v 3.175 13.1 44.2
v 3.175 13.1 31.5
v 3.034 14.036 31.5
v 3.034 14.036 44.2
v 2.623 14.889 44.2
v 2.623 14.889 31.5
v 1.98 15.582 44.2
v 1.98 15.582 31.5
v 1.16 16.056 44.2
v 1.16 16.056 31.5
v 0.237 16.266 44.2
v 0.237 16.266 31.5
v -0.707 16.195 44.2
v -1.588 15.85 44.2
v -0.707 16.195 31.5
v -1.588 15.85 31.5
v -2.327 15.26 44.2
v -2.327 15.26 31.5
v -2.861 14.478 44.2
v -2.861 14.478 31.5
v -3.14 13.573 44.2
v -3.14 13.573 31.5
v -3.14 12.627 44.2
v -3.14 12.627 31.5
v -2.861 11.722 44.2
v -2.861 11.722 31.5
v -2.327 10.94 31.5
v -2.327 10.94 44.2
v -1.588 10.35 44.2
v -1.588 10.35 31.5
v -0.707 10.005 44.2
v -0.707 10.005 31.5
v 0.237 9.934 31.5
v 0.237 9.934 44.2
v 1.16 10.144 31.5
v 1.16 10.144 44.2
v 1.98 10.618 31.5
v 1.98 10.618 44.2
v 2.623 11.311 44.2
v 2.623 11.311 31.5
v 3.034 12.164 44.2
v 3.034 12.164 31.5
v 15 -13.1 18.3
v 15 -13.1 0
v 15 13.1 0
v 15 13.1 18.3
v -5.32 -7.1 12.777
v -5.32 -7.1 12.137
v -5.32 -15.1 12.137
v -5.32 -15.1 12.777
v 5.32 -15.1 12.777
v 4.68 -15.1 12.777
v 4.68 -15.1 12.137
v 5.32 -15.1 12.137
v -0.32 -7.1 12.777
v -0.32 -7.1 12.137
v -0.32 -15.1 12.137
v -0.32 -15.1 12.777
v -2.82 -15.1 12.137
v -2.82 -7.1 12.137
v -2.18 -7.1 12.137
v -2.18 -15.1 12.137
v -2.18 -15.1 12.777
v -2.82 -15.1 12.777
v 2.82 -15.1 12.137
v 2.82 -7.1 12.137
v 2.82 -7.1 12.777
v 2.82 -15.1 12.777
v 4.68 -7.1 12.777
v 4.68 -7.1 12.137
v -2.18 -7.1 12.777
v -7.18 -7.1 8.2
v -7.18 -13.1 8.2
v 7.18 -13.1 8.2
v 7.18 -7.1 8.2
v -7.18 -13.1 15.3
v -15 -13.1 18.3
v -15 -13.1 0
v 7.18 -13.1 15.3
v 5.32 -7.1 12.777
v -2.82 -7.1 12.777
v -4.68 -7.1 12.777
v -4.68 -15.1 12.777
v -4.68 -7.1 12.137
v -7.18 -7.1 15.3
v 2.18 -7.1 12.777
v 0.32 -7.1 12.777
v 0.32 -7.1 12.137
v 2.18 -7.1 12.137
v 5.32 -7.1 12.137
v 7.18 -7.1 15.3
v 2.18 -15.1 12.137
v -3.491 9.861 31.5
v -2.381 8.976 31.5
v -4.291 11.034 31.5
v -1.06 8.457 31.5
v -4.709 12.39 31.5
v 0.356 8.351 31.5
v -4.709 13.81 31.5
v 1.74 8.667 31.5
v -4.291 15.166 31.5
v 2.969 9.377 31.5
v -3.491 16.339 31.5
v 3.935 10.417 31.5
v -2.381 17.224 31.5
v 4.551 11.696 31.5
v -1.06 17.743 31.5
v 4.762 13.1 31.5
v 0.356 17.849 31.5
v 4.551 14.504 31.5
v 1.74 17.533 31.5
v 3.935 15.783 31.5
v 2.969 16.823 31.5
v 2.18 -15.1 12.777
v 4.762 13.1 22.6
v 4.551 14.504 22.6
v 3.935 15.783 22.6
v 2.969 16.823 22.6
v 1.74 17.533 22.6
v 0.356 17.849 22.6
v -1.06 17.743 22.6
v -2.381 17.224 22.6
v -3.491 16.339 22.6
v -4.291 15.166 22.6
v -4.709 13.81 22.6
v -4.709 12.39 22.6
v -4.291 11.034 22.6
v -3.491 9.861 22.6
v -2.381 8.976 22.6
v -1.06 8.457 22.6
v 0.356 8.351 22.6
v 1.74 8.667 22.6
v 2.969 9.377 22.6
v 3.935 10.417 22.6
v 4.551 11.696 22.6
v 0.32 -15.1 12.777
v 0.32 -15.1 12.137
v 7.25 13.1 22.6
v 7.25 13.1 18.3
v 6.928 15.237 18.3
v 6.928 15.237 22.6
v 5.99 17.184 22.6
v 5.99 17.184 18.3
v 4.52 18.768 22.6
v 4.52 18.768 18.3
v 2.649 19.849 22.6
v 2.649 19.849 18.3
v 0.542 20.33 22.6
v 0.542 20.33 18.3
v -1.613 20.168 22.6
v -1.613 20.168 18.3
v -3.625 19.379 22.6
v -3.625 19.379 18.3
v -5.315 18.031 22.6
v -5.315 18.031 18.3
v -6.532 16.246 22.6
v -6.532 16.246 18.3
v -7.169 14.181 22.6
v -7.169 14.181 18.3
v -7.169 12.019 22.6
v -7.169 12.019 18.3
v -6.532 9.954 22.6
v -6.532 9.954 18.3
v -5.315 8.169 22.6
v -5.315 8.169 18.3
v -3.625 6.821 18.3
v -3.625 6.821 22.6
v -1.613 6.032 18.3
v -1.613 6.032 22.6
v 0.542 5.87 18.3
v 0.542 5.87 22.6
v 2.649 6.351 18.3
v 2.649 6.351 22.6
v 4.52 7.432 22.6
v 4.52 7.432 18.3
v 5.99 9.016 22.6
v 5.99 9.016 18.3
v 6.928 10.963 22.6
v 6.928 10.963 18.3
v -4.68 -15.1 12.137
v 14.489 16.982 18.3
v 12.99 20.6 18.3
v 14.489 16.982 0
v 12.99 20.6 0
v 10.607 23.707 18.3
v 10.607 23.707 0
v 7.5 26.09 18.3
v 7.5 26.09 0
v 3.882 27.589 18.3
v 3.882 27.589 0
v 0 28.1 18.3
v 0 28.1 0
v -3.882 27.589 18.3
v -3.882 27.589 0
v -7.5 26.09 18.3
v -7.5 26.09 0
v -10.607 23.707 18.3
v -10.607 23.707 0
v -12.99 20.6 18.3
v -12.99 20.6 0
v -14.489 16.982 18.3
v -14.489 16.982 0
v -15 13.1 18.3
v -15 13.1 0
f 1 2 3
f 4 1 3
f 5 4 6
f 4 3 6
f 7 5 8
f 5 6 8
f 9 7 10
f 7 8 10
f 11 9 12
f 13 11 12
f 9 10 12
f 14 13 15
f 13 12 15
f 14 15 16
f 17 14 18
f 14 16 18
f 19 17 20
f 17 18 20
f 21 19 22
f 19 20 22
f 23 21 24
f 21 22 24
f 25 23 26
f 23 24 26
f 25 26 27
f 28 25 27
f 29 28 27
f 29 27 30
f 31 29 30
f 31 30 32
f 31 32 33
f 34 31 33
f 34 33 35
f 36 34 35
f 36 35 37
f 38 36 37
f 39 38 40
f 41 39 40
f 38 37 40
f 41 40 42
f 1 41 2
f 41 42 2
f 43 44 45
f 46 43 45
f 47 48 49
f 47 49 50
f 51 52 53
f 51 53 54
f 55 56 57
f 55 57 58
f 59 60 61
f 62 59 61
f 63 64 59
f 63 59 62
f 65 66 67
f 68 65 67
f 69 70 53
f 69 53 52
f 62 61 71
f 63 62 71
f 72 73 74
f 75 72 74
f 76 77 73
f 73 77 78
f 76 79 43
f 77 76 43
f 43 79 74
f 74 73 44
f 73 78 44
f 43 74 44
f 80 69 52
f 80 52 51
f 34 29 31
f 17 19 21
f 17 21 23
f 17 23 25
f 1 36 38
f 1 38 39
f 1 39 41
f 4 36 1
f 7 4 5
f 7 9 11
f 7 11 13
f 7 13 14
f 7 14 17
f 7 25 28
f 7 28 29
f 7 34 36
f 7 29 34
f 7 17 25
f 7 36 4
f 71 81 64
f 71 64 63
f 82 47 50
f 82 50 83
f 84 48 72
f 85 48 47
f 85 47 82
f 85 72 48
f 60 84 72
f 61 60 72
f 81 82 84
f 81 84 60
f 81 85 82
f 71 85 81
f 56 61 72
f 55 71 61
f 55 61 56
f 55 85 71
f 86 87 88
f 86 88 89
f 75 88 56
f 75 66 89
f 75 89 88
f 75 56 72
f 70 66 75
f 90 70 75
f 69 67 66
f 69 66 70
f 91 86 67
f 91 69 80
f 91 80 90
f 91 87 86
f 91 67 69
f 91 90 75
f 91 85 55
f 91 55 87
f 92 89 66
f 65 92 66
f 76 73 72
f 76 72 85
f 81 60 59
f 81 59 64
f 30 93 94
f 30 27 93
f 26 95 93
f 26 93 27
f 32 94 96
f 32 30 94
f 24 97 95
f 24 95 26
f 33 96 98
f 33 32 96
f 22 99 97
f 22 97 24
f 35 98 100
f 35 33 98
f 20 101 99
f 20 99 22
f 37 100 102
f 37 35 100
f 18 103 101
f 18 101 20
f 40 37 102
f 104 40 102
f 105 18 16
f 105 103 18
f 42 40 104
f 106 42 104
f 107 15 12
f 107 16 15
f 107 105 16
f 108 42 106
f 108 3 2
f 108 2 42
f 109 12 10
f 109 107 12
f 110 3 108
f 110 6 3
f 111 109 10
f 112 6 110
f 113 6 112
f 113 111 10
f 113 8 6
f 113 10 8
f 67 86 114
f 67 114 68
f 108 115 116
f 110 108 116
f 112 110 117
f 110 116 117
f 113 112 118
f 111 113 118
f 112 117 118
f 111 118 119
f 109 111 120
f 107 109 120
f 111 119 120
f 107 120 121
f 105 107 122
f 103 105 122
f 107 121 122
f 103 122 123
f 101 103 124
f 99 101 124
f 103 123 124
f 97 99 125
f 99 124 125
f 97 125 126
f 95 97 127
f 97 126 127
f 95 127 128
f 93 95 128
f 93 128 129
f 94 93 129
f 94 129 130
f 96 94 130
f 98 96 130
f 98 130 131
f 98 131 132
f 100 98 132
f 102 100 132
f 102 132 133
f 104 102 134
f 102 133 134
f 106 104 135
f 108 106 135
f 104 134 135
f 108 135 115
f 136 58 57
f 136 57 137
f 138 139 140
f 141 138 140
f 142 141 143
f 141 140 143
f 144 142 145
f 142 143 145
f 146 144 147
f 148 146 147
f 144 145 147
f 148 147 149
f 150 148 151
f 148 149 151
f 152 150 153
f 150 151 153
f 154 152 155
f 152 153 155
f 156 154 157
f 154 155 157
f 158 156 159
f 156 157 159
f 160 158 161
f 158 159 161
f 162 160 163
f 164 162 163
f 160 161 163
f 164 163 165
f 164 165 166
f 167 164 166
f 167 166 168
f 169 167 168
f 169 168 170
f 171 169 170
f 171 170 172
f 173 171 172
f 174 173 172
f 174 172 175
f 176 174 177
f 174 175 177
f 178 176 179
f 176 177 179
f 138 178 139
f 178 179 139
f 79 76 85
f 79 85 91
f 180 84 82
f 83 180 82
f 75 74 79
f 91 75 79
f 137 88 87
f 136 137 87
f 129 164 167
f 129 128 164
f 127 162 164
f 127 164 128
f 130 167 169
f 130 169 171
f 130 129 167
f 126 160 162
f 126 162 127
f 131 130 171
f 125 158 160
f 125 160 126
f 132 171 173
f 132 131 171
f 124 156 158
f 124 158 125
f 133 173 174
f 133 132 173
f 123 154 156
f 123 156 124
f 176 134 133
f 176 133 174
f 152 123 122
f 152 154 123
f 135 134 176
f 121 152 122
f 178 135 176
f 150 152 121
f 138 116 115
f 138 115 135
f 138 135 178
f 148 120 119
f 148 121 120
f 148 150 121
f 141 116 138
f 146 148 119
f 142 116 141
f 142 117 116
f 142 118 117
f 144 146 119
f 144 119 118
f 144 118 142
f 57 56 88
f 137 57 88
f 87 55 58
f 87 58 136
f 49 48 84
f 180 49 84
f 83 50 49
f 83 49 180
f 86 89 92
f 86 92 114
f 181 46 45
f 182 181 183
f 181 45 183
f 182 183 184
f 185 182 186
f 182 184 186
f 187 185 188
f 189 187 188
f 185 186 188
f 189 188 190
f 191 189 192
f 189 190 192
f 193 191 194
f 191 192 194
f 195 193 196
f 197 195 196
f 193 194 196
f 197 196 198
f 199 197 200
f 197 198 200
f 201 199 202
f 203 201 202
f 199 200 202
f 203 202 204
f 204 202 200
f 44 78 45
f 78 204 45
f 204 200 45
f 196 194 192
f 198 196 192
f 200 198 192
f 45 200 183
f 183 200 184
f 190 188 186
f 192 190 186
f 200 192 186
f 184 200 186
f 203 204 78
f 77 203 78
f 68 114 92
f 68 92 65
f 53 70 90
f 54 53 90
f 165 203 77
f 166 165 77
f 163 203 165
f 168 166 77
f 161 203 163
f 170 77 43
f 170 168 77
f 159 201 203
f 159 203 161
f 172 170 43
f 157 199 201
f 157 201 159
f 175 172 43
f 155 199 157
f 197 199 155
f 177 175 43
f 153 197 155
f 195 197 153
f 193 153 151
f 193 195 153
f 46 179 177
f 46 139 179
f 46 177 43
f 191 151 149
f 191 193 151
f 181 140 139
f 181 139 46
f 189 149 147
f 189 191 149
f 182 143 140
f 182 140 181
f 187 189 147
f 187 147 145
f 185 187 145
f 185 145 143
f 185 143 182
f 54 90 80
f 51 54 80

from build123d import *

# Parameters (mm, degrees)
BOSS_EXTRU_1_DEPTH      = 18.3
ESQUISSE2_R             = 7.25
BOSS_EXTRU_2_DEPTH      = 4.3
ESQUISSE3_R             = 4.7625
BOSS_EXTRU_3_DEPTH      = 8.9
ESQUISSE4_R             = 3.175
BOSS_EXTRU_4_DEPTH      = 12.7
ESQUISSE5_W             = 14.36
ESQUISSE5_H             = 7.1
ENL_V_MAT_EXTRU_2_DEPTH = 6
ESQUISSE6_W             = 0.64
ESQUISSE6_H             = 0.64
BOSS_EXTRU_5_DEPTH      = 8


with BuildPart() as part:
    # Esquisse1 → Boss.-Extru.1 (new body)
    with BuildSketch(Plane.XY):
        with BuildLine():
            Line((-15, -13.1), (15, -13.1))
            Line((15, -13.1), (15, 13.1))
            ThreePointArc((15, 13.1), (0, 28.1), (-15, 13.1))
            Line((-15, 13.1), (-15, -13.1))
        make_face()
    extrude(amount=BOSS_EXTRU_1_DEPTH)

    # Esquisse2 → Boss.-Extru.2 (add)
    with BuildSketch(Plane.XY.offset(18.3)):
        with Locations((0, 13.1)):
            Circle(ESQUISSE2_R)
    extrude(amount=BOSS_EXTRU_2_DEPTH)

    # Esquisse3 → Boss.-Extru.3 (add)
    with BuildSketch(Plane.XY.offset(22.6)):
        with Locations((0, 13.1)):
            Circle(ESQUISSE3_R)
    extrude(amount=BOSS_EXTRU_3_DEPTH)

    # Esquisse4 → Boss.-Extru.4 (add)
    with BuildSketch(Plane.XY.offset(31.5)):
        with Locations((0, 13.1)):
            Circle(ESQUISSE4_R)
    extrude(amount=BOSS_EXTRU_4_DEPTH)

    # Esquisse5 → Enlèv. mat.-Extru.2 (cut)
    with BuildSketch(Plane.XZ.offset(13.1)):
        with Locations((0, 11.75)):
            Rectangle(ESQUISSE5_W, ESQUISSE5_H)
    extrude(amount=-ENL_V_MAT_EXTRU_2_DEPTH, mode=Mode.SUBTRACT)

    # Esquisse6 → Boss.-Extru.5 (add)
    with BuildSketch(Plane.XZ.offset(7.1)):
        with Locations((-5, 12.457086597)):
            Rectangle(ESQUISSE6_W, ESQUISSE6_H)
        with Locations((-2.5, 12.457086597)):
            Rectangle(ESQUISSE6_W, ESQUISSE6_H)
        with Locations((0, 12.457086597)):
            Rectangle(ESQUISSE6_W, ESQUISSE6_H)
        with Locations((2.5, 12.457086597)):
            Rectangle(ESQUISSE6_W, ESQUISSE6_H)
        with Locations((5, 12.457086597)):
            Rectangle(ESQUISSE6_W, ESQUISSE6_H)
    extrude(amount=BOSS_EXTRU_5_DEPTH)


solid = part.part
